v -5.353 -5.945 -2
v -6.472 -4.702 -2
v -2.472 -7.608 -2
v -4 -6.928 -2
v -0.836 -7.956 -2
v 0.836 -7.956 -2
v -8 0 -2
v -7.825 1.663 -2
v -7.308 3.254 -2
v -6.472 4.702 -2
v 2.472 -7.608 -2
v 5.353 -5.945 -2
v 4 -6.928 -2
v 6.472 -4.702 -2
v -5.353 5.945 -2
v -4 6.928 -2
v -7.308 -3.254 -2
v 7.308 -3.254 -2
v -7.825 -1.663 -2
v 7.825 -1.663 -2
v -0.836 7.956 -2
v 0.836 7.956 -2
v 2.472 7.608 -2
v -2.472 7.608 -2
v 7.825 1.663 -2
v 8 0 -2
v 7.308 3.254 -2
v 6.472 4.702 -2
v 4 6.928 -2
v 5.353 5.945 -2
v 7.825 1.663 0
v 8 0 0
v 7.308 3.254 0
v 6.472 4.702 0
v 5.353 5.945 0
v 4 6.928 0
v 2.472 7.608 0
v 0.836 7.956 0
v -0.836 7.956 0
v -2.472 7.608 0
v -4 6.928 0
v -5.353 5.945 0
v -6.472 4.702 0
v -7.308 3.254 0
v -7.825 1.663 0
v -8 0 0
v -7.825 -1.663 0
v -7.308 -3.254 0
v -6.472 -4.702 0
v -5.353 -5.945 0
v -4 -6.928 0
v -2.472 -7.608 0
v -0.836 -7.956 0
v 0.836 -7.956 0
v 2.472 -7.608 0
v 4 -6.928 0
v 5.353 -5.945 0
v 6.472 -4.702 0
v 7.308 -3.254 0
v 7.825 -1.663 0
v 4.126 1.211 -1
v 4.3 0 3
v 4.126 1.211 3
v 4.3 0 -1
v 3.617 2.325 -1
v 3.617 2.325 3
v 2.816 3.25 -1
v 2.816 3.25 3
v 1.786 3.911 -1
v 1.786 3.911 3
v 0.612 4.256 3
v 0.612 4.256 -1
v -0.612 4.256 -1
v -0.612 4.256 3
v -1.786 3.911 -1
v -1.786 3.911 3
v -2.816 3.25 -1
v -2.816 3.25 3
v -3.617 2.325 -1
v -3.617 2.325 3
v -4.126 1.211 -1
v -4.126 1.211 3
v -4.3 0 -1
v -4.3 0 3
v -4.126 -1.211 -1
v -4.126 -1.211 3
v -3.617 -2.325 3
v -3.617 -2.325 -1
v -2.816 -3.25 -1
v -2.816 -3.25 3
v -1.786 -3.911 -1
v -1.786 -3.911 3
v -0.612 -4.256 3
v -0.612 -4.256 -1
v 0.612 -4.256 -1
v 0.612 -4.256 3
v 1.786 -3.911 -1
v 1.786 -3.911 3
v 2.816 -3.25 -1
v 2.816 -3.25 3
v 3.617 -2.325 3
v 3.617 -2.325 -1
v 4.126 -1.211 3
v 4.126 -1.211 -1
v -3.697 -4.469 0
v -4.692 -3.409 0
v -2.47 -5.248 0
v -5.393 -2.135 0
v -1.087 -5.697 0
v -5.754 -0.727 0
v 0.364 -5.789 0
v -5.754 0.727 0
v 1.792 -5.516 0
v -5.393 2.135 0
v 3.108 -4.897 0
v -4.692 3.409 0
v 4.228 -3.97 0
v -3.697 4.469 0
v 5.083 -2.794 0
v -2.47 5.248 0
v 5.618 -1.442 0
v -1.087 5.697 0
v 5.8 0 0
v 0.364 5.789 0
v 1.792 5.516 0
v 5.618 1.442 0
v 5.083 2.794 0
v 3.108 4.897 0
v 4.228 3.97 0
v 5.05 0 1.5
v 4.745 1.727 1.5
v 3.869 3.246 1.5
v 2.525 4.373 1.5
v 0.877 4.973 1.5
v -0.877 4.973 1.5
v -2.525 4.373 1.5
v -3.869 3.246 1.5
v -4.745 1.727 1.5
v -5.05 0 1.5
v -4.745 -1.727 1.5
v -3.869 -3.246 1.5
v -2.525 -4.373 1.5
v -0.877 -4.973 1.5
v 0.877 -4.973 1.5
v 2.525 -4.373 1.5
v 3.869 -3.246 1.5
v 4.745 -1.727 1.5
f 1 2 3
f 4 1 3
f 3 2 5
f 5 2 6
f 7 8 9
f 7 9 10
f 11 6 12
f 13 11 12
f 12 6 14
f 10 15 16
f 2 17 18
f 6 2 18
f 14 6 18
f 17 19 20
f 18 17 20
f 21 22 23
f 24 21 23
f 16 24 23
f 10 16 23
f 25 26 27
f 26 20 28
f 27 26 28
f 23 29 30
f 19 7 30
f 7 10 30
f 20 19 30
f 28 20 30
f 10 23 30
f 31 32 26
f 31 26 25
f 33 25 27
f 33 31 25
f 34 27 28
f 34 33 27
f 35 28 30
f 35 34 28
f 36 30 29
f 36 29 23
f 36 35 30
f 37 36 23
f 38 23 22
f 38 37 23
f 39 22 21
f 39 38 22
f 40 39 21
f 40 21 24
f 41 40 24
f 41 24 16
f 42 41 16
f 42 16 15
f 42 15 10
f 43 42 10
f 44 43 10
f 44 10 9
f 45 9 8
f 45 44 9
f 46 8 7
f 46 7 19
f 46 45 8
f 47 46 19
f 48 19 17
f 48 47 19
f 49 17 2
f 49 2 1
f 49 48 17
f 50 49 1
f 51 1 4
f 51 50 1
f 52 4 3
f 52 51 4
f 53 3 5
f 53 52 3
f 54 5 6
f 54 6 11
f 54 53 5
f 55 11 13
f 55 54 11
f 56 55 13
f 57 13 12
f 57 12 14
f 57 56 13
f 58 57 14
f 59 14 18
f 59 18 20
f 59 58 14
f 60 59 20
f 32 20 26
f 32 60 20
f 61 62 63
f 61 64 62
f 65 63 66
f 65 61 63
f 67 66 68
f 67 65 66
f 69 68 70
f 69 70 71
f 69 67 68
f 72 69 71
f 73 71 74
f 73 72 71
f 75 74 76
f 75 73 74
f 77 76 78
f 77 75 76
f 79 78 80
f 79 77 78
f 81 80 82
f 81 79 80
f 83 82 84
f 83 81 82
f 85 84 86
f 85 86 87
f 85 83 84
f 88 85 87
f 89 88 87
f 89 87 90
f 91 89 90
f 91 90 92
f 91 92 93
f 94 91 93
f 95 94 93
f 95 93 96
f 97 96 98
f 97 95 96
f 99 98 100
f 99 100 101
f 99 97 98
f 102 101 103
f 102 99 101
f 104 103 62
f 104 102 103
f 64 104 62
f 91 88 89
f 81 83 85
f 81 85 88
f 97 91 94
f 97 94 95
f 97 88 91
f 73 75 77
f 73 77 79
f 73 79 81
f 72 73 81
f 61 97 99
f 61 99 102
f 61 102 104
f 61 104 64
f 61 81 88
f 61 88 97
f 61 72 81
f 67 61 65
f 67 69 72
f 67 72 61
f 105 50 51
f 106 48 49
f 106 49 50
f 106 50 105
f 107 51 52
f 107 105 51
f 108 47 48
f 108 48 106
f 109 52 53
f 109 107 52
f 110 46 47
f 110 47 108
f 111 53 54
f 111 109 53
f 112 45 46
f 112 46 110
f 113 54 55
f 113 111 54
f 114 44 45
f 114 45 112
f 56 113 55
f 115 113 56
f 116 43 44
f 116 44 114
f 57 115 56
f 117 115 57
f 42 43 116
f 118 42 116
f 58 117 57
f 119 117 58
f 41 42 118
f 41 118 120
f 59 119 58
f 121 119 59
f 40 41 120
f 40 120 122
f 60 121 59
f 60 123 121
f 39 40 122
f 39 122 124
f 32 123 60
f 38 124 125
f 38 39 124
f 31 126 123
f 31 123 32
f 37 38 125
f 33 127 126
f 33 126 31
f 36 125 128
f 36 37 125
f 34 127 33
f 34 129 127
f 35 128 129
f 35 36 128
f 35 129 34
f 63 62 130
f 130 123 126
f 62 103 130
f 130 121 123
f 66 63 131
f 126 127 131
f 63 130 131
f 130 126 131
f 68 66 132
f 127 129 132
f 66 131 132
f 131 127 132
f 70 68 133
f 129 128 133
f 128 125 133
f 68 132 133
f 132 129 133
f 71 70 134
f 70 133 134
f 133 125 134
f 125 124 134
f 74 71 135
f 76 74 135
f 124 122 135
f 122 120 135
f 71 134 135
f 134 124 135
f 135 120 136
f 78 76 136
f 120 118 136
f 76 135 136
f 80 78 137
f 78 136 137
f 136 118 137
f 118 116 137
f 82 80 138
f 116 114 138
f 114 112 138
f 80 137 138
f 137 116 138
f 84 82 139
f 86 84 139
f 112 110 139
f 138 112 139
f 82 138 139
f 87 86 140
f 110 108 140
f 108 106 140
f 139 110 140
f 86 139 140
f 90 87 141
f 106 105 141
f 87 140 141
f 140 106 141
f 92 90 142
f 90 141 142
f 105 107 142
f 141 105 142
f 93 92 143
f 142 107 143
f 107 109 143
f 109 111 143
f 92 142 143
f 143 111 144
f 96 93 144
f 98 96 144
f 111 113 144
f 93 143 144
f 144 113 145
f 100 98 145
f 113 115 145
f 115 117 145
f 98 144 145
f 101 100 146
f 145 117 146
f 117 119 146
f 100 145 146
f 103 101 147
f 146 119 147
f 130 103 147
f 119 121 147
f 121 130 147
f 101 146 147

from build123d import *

# Parameters (mm, degrees)
F0_R     = 5.8
F0_R_2   = 4.3
F1_DEPTH = 3
F0_R_3   = 8
F2_DEPTH = 2
F6_DEPTH = 1


with BuildPart() as f1:
    # F0 (on Top) → F1 (new body)
    with BuildSketch(Plane.XY):
        Circle(F0_R)
        Circle(F0_R_2, mode=Mode.SUBTRACT)
    extrude(amount=F1_DEPTH)

    # F0 (on Top) → F2 (join)
    with BuildSketch(Plane.XY):
        Circle(F0_R_3)
        Circle(F0_R, mode=Mode.SUBTRACT)
        Circle(F0_R)
        Circle(F0_R_2, mode=Mode.SUBTRACT)
        Circle(F0_R_2)
    extrude(amount=-F2_DEPTH)

    # F3 (on Front) → F5 (revolve, cut)
    with BuildSketch(Plane.XZ):
        Polygon((5.8, 3), (4.3, 3), (5.8, 0), align=None)
    revolve(axis=Axis((0, 0, 7.644158), (0, 0, 1)), mode=Mode.SUBTRACT)

    # F0 (on Top) → F6 (cut)
    with BuildSketch(Plane.XY):
        Circle(F0_R_2)
    extrude(amount=-F6_DEPTH, mode=Mode.SUBTRACT)


solid = f1.part
